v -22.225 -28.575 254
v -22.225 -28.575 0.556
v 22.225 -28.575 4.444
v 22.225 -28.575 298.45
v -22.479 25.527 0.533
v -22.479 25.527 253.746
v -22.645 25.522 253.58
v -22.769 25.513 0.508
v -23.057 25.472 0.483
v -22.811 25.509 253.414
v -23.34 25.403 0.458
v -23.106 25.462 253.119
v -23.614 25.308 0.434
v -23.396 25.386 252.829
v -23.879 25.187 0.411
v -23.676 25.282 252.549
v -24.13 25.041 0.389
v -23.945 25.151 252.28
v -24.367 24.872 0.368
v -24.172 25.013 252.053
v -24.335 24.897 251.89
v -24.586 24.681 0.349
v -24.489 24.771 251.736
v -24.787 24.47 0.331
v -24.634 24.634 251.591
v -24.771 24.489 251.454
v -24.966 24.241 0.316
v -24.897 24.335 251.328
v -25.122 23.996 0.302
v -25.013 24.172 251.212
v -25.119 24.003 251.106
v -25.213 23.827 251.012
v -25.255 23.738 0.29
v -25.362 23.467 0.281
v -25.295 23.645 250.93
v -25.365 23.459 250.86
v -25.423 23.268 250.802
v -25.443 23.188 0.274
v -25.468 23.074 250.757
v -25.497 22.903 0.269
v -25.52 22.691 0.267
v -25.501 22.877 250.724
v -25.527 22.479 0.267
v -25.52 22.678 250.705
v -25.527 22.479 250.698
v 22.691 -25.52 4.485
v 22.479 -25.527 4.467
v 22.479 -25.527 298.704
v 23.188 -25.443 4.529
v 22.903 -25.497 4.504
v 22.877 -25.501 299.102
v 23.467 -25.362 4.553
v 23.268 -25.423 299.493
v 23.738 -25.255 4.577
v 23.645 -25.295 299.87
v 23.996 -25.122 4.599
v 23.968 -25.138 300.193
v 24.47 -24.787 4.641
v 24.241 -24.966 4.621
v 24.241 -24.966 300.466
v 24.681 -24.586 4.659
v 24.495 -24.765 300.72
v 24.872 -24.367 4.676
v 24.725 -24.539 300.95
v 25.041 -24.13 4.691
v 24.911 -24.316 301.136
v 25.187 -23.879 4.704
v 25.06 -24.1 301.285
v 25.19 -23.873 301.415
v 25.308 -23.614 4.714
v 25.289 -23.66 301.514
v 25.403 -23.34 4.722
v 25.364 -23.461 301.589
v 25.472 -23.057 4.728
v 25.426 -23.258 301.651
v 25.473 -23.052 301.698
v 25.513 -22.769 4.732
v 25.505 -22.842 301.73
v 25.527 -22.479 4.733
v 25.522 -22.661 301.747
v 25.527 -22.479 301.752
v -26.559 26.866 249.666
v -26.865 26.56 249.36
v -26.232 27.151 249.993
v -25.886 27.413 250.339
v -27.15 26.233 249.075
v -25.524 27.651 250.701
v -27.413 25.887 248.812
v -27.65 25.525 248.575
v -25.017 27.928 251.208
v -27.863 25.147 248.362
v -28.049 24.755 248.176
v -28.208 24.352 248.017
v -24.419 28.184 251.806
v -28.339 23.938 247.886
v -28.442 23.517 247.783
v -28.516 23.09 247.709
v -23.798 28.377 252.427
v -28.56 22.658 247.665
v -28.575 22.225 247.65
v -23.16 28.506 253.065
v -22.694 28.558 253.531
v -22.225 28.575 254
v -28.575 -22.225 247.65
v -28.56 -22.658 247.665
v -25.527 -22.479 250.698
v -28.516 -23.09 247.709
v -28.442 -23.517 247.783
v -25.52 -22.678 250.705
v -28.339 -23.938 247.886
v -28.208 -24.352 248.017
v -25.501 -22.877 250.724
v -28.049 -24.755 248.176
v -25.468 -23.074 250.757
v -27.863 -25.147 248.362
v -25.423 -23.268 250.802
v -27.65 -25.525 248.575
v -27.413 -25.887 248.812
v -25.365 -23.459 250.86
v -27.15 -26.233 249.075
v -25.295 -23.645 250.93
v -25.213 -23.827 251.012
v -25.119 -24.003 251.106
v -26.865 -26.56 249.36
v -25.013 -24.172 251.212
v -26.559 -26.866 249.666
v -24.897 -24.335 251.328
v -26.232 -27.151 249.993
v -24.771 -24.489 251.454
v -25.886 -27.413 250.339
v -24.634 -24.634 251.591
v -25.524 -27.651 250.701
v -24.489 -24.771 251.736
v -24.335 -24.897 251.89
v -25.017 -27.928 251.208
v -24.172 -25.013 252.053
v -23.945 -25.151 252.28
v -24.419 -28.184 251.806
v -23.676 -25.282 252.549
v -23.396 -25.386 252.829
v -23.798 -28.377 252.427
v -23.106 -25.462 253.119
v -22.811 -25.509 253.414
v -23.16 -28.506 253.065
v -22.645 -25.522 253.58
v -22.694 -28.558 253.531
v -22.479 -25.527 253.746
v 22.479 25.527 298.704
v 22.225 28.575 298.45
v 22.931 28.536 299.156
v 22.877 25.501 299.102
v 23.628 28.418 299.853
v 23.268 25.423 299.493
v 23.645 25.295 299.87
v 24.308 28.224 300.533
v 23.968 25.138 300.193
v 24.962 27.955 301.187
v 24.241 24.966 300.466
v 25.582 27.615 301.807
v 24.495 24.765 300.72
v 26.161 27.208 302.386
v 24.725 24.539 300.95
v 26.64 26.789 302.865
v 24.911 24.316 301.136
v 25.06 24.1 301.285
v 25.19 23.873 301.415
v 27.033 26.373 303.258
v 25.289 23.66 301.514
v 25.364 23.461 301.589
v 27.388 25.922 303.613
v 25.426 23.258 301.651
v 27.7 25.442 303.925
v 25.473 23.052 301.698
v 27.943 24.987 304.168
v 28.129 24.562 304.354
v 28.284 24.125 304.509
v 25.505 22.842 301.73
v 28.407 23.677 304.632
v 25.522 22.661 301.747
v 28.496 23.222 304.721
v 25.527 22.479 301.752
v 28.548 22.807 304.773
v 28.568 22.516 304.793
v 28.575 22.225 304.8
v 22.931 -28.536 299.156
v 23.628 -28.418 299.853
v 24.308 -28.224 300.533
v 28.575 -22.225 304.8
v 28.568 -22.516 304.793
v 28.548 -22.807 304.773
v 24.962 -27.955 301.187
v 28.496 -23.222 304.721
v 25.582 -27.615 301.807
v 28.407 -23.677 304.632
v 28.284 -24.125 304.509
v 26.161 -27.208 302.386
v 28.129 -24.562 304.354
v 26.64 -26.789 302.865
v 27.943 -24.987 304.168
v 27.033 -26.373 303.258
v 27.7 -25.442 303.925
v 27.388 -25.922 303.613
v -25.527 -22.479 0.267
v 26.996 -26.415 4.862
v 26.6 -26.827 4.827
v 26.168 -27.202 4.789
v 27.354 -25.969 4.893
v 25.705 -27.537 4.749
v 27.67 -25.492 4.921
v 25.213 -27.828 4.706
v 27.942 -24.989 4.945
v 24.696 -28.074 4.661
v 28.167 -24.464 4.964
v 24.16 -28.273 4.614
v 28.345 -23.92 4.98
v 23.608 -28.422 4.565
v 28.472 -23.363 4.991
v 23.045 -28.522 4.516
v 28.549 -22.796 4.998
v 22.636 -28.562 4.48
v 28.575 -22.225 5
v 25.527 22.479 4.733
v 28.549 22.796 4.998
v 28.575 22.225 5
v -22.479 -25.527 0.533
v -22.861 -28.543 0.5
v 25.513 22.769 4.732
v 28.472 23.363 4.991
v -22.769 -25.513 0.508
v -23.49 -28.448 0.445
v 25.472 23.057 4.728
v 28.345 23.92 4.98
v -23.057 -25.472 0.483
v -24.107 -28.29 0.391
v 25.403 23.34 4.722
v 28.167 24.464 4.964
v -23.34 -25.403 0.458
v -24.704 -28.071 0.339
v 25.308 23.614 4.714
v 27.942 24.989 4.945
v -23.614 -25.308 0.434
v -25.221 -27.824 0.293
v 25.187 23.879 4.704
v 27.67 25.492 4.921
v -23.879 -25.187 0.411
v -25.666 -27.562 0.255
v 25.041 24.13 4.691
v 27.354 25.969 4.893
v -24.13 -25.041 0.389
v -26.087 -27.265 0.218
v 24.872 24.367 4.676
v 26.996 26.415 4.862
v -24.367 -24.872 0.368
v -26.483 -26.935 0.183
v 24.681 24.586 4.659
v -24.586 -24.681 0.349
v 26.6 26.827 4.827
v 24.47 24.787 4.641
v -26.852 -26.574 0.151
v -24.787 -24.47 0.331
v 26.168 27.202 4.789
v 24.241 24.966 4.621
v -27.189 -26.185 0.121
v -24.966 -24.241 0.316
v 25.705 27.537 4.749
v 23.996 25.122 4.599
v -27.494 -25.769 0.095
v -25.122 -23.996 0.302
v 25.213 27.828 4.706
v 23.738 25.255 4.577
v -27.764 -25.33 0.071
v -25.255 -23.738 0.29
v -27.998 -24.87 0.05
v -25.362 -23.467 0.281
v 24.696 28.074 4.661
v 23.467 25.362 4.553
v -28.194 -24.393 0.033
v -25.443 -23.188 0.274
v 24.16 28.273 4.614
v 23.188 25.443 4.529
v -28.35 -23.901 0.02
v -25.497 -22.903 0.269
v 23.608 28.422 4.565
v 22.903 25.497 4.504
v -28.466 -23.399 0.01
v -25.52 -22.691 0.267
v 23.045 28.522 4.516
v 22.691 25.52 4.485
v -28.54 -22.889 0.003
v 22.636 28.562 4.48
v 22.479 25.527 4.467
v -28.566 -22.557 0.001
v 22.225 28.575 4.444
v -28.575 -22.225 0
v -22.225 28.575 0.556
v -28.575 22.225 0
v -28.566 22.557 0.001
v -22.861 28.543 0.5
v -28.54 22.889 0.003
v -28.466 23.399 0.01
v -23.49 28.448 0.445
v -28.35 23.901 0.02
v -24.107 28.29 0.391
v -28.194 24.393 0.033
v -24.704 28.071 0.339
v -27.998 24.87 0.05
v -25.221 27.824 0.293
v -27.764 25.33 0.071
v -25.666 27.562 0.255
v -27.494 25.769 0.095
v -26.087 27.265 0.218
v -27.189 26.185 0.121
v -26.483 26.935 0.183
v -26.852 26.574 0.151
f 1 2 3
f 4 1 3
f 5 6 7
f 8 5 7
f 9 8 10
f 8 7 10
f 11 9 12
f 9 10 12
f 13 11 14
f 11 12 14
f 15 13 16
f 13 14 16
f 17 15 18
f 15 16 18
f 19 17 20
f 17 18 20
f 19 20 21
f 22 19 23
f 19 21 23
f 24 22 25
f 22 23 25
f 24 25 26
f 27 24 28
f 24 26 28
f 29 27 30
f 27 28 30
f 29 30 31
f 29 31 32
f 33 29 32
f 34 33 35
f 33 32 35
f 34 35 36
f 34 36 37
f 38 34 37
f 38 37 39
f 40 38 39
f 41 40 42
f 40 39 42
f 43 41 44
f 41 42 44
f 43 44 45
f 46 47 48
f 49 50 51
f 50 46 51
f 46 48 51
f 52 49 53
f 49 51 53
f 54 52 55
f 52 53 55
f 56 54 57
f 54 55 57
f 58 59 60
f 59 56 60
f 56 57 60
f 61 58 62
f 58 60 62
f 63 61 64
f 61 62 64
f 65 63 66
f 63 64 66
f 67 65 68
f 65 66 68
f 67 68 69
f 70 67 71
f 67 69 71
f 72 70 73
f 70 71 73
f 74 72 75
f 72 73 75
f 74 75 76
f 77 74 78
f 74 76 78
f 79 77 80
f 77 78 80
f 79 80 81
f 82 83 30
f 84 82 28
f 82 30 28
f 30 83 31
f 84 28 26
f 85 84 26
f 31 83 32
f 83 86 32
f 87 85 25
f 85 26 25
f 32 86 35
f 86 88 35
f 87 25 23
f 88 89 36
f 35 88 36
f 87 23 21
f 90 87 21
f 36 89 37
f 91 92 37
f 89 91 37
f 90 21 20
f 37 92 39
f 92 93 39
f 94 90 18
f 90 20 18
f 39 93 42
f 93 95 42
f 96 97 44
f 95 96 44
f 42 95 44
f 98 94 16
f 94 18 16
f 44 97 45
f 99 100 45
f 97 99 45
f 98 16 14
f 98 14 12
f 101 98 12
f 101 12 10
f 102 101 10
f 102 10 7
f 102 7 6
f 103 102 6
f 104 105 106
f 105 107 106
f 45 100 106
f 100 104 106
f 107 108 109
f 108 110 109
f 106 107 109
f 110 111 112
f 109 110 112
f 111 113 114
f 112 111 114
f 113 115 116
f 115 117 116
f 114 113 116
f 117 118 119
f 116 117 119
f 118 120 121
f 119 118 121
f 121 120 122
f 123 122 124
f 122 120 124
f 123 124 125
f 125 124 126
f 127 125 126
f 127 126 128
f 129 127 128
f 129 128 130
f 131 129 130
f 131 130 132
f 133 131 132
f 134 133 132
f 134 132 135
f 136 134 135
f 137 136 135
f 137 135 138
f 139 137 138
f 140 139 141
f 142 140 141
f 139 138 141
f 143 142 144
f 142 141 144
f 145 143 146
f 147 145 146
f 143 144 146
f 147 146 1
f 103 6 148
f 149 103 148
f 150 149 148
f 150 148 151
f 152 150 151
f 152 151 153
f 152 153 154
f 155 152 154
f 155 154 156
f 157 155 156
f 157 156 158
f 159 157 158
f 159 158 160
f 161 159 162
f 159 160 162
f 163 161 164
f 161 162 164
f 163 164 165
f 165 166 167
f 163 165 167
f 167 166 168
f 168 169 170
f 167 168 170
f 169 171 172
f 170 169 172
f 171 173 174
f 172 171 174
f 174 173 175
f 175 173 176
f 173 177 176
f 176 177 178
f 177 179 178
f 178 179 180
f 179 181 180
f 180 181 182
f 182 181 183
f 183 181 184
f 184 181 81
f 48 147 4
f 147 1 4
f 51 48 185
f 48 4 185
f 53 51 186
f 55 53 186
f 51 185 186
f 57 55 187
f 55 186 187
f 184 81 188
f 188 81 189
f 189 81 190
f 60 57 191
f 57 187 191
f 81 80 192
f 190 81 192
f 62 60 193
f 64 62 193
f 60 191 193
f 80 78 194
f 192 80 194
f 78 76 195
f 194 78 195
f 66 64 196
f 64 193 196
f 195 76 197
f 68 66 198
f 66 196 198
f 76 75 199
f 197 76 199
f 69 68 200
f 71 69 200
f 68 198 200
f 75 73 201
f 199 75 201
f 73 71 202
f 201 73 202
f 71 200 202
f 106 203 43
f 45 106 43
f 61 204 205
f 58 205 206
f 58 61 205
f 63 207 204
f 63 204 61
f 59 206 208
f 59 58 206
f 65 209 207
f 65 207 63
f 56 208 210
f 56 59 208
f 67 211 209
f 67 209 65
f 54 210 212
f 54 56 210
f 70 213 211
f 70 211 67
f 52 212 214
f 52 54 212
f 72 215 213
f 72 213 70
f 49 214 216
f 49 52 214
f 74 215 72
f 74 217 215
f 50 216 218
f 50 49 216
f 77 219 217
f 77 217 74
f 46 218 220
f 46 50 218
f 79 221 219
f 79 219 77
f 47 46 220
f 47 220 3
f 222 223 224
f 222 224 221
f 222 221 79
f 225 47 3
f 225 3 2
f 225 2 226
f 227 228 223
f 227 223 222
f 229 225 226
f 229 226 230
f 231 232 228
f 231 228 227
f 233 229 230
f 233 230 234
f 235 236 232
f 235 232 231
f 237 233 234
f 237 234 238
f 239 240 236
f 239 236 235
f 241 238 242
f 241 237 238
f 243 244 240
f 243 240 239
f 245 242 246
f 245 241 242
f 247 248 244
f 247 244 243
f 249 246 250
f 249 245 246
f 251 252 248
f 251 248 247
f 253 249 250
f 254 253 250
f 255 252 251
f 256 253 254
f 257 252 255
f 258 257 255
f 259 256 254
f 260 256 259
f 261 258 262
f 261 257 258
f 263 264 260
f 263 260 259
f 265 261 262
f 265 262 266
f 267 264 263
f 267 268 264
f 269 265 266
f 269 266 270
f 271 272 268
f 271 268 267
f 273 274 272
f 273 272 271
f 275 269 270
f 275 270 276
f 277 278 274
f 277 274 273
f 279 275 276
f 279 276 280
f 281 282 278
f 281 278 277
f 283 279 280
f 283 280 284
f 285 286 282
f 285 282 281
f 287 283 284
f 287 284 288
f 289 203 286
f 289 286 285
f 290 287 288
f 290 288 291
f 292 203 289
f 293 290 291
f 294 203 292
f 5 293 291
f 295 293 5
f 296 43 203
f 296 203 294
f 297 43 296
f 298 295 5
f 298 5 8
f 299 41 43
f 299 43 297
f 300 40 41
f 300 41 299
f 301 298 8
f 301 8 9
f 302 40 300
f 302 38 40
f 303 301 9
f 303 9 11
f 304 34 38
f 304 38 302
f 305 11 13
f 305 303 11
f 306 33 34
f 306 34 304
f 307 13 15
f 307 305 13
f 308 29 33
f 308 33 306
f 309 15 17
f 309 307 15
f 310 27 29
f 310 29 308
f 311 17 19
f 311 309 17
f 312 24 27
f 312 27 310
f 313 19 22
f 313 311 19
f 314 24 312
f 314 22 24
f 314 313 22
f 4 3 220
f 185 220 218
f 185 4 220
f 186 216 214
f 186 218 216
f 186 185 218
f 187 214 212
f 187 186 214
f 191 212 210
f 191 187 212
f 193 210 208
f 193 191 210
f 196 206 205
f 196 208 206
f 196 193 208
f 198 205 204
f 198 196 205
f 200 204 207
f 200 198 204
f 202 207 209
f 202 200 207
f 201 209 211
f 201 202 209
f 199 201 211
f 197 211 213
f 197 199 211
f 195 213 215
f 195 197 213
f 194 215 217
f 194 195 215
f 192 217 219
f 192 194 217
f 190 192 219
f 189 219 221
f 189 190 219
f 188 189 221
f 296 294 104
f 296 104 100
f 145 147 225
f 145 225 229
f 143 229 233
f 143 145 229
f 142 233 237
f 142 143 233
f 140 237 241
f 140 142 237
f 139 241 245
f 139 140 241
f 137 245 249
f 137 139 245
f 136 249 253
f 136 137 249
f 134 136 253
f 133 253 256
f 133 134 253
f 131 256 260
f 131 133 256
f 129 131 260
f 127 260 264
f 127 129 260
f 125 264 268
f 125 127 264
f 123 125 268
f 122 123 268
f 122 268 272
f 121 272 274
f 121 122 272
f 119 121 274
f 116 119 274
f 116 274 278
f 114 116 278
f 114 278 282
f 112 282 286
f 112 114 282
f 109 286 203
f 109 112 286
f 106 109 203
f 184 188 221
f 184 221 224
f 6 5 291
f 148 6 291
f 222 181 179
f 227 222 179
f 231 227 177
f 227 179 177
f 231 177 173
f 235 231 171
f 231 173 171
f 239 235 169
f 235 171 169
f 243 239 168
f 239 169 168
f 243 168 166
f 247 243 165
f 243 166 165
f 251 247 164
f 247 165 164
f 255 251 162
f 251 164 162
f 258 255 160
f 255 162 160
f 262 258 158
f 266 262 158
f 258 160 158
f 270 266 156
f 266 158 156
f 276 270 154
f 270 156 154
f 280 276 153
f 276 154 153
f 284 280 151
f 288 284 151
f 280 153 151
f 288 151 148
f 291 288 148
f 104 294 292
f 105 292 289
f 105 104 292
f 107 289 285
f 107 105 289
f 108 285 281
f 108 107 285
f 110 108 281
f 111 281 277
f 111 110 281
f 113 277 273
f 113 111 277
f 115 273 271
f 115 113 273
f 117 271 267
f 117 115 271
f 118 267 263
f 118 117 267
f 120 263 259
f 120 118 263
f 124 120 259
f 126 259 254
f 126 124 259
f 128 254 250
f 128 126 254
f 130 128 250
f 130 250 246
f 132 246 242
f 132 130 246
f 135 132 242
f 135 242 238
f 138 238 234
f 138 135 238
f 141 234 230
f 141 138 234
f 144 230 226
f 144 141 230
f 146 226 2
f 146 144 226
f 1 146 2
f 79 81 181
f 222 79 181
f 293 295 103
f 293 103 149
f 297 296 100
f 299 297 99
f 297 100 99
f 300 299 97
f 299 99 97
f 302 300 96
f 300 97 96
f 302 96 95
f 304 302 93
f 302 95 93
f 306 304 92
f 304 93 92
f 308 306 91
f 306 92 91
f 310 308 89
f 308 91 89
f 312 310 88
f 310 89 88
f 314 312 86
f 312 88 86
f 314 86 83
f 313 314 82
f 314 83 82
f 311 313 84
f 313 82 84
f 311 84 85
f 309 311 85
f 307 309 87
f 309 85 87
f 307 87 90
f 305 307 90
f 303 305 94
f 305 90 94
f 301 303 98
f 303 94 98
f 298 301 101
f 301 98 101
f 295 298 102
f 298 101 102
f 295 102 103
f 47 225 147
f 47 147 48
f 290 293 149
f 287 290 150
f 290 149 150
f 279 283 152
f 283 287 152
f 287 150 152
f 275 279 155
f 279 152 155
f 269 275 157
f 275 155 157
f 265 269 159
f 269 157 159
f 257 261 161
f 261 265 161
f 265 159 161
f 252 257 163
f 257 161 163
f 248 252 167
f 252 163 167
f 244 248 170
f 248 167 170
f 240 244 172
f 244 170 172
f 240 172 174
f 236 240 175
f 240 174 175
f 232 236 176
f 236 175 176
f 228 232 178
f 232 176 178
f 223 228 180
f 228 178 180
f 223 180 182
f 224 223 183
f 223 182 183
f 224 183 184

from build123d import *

# Parameters (mm, degrees)
F0_W          = 57.15
F0_H          = 57.15
F0_W_2        = 51.054
F0_H_2        = 51.054
F1_DEPTH      = 304.8
F2_R          = 3.048
F3_R          = 6.35
F5_DEPTH      = 28.576
F5_DEPTH_BACK = 28.576
F7_DEPTH      = 28.576
F7_DEPTH_BACK = 28.576


with BuildPart() as f1:
    # F0 (on Top) → F1 (new body)
    with BuildSketch(Plane.XY):
        Rectangle(F0_W, F0_H)
        Rectangle(F0_W_2, F0_H_2, mode=Mode.SUBTRACT)
    extrude(amount=F1_DEPTH)

    # F2
    f2_edges = [f1.edges().sort_by_distance(p)[0] for p in [
        (25.527, 25.527, 152.4),
        (-25.527, 25.527, 152.4),
        (-25.527, -25.527, 152.4),
        (25.527, -25.527, 152.4),
    ]]
    fillet(f2_edges, radius=F2_R)

    # F3
    f3_edges = [f1.edges().sort_by_distance(p)[0] for p in [
        (-28.575, 28.575, 152.4),
        (-28.575, -28.575, 152.4),
        (28.575, -28.575, 152.4),
        (28.575, 28.575, 152.4),
    ]]
    fillet(f3_edges, radius=F3_R)

    # F4 (on Front) → F5 (cut, two sides)
    with BuildSketch(Plane.XZ) as f5_sk:
        Polygon((-28.575, 247.65), (28.575, 304.8), (-28.575, 304.8), align=None)
    extrude(amount=-F5_DEPTH, mode=Mode.SUBTRACT)
    extrude(f5_sk.sketch, amount=F5_DEPTH_BACK, mode=Mode.SUBTRACT)

    # F6 (on Front) → F7 (cut, two sides)
    with BuildSketch(Plane.XZ) as f7_sk:
        Polygon((28.575, 4.9999771205), (-28.575, 0), (28.575, 0), align=None)
    extrude(amount=-F7_DEPTH, mode=Mode.SUBTRACT)
    extrude(f7_sk.sketch, amount=F7_DEPTH_BACK, mode=Mode.SUBTRACT)


solid = f1.part
